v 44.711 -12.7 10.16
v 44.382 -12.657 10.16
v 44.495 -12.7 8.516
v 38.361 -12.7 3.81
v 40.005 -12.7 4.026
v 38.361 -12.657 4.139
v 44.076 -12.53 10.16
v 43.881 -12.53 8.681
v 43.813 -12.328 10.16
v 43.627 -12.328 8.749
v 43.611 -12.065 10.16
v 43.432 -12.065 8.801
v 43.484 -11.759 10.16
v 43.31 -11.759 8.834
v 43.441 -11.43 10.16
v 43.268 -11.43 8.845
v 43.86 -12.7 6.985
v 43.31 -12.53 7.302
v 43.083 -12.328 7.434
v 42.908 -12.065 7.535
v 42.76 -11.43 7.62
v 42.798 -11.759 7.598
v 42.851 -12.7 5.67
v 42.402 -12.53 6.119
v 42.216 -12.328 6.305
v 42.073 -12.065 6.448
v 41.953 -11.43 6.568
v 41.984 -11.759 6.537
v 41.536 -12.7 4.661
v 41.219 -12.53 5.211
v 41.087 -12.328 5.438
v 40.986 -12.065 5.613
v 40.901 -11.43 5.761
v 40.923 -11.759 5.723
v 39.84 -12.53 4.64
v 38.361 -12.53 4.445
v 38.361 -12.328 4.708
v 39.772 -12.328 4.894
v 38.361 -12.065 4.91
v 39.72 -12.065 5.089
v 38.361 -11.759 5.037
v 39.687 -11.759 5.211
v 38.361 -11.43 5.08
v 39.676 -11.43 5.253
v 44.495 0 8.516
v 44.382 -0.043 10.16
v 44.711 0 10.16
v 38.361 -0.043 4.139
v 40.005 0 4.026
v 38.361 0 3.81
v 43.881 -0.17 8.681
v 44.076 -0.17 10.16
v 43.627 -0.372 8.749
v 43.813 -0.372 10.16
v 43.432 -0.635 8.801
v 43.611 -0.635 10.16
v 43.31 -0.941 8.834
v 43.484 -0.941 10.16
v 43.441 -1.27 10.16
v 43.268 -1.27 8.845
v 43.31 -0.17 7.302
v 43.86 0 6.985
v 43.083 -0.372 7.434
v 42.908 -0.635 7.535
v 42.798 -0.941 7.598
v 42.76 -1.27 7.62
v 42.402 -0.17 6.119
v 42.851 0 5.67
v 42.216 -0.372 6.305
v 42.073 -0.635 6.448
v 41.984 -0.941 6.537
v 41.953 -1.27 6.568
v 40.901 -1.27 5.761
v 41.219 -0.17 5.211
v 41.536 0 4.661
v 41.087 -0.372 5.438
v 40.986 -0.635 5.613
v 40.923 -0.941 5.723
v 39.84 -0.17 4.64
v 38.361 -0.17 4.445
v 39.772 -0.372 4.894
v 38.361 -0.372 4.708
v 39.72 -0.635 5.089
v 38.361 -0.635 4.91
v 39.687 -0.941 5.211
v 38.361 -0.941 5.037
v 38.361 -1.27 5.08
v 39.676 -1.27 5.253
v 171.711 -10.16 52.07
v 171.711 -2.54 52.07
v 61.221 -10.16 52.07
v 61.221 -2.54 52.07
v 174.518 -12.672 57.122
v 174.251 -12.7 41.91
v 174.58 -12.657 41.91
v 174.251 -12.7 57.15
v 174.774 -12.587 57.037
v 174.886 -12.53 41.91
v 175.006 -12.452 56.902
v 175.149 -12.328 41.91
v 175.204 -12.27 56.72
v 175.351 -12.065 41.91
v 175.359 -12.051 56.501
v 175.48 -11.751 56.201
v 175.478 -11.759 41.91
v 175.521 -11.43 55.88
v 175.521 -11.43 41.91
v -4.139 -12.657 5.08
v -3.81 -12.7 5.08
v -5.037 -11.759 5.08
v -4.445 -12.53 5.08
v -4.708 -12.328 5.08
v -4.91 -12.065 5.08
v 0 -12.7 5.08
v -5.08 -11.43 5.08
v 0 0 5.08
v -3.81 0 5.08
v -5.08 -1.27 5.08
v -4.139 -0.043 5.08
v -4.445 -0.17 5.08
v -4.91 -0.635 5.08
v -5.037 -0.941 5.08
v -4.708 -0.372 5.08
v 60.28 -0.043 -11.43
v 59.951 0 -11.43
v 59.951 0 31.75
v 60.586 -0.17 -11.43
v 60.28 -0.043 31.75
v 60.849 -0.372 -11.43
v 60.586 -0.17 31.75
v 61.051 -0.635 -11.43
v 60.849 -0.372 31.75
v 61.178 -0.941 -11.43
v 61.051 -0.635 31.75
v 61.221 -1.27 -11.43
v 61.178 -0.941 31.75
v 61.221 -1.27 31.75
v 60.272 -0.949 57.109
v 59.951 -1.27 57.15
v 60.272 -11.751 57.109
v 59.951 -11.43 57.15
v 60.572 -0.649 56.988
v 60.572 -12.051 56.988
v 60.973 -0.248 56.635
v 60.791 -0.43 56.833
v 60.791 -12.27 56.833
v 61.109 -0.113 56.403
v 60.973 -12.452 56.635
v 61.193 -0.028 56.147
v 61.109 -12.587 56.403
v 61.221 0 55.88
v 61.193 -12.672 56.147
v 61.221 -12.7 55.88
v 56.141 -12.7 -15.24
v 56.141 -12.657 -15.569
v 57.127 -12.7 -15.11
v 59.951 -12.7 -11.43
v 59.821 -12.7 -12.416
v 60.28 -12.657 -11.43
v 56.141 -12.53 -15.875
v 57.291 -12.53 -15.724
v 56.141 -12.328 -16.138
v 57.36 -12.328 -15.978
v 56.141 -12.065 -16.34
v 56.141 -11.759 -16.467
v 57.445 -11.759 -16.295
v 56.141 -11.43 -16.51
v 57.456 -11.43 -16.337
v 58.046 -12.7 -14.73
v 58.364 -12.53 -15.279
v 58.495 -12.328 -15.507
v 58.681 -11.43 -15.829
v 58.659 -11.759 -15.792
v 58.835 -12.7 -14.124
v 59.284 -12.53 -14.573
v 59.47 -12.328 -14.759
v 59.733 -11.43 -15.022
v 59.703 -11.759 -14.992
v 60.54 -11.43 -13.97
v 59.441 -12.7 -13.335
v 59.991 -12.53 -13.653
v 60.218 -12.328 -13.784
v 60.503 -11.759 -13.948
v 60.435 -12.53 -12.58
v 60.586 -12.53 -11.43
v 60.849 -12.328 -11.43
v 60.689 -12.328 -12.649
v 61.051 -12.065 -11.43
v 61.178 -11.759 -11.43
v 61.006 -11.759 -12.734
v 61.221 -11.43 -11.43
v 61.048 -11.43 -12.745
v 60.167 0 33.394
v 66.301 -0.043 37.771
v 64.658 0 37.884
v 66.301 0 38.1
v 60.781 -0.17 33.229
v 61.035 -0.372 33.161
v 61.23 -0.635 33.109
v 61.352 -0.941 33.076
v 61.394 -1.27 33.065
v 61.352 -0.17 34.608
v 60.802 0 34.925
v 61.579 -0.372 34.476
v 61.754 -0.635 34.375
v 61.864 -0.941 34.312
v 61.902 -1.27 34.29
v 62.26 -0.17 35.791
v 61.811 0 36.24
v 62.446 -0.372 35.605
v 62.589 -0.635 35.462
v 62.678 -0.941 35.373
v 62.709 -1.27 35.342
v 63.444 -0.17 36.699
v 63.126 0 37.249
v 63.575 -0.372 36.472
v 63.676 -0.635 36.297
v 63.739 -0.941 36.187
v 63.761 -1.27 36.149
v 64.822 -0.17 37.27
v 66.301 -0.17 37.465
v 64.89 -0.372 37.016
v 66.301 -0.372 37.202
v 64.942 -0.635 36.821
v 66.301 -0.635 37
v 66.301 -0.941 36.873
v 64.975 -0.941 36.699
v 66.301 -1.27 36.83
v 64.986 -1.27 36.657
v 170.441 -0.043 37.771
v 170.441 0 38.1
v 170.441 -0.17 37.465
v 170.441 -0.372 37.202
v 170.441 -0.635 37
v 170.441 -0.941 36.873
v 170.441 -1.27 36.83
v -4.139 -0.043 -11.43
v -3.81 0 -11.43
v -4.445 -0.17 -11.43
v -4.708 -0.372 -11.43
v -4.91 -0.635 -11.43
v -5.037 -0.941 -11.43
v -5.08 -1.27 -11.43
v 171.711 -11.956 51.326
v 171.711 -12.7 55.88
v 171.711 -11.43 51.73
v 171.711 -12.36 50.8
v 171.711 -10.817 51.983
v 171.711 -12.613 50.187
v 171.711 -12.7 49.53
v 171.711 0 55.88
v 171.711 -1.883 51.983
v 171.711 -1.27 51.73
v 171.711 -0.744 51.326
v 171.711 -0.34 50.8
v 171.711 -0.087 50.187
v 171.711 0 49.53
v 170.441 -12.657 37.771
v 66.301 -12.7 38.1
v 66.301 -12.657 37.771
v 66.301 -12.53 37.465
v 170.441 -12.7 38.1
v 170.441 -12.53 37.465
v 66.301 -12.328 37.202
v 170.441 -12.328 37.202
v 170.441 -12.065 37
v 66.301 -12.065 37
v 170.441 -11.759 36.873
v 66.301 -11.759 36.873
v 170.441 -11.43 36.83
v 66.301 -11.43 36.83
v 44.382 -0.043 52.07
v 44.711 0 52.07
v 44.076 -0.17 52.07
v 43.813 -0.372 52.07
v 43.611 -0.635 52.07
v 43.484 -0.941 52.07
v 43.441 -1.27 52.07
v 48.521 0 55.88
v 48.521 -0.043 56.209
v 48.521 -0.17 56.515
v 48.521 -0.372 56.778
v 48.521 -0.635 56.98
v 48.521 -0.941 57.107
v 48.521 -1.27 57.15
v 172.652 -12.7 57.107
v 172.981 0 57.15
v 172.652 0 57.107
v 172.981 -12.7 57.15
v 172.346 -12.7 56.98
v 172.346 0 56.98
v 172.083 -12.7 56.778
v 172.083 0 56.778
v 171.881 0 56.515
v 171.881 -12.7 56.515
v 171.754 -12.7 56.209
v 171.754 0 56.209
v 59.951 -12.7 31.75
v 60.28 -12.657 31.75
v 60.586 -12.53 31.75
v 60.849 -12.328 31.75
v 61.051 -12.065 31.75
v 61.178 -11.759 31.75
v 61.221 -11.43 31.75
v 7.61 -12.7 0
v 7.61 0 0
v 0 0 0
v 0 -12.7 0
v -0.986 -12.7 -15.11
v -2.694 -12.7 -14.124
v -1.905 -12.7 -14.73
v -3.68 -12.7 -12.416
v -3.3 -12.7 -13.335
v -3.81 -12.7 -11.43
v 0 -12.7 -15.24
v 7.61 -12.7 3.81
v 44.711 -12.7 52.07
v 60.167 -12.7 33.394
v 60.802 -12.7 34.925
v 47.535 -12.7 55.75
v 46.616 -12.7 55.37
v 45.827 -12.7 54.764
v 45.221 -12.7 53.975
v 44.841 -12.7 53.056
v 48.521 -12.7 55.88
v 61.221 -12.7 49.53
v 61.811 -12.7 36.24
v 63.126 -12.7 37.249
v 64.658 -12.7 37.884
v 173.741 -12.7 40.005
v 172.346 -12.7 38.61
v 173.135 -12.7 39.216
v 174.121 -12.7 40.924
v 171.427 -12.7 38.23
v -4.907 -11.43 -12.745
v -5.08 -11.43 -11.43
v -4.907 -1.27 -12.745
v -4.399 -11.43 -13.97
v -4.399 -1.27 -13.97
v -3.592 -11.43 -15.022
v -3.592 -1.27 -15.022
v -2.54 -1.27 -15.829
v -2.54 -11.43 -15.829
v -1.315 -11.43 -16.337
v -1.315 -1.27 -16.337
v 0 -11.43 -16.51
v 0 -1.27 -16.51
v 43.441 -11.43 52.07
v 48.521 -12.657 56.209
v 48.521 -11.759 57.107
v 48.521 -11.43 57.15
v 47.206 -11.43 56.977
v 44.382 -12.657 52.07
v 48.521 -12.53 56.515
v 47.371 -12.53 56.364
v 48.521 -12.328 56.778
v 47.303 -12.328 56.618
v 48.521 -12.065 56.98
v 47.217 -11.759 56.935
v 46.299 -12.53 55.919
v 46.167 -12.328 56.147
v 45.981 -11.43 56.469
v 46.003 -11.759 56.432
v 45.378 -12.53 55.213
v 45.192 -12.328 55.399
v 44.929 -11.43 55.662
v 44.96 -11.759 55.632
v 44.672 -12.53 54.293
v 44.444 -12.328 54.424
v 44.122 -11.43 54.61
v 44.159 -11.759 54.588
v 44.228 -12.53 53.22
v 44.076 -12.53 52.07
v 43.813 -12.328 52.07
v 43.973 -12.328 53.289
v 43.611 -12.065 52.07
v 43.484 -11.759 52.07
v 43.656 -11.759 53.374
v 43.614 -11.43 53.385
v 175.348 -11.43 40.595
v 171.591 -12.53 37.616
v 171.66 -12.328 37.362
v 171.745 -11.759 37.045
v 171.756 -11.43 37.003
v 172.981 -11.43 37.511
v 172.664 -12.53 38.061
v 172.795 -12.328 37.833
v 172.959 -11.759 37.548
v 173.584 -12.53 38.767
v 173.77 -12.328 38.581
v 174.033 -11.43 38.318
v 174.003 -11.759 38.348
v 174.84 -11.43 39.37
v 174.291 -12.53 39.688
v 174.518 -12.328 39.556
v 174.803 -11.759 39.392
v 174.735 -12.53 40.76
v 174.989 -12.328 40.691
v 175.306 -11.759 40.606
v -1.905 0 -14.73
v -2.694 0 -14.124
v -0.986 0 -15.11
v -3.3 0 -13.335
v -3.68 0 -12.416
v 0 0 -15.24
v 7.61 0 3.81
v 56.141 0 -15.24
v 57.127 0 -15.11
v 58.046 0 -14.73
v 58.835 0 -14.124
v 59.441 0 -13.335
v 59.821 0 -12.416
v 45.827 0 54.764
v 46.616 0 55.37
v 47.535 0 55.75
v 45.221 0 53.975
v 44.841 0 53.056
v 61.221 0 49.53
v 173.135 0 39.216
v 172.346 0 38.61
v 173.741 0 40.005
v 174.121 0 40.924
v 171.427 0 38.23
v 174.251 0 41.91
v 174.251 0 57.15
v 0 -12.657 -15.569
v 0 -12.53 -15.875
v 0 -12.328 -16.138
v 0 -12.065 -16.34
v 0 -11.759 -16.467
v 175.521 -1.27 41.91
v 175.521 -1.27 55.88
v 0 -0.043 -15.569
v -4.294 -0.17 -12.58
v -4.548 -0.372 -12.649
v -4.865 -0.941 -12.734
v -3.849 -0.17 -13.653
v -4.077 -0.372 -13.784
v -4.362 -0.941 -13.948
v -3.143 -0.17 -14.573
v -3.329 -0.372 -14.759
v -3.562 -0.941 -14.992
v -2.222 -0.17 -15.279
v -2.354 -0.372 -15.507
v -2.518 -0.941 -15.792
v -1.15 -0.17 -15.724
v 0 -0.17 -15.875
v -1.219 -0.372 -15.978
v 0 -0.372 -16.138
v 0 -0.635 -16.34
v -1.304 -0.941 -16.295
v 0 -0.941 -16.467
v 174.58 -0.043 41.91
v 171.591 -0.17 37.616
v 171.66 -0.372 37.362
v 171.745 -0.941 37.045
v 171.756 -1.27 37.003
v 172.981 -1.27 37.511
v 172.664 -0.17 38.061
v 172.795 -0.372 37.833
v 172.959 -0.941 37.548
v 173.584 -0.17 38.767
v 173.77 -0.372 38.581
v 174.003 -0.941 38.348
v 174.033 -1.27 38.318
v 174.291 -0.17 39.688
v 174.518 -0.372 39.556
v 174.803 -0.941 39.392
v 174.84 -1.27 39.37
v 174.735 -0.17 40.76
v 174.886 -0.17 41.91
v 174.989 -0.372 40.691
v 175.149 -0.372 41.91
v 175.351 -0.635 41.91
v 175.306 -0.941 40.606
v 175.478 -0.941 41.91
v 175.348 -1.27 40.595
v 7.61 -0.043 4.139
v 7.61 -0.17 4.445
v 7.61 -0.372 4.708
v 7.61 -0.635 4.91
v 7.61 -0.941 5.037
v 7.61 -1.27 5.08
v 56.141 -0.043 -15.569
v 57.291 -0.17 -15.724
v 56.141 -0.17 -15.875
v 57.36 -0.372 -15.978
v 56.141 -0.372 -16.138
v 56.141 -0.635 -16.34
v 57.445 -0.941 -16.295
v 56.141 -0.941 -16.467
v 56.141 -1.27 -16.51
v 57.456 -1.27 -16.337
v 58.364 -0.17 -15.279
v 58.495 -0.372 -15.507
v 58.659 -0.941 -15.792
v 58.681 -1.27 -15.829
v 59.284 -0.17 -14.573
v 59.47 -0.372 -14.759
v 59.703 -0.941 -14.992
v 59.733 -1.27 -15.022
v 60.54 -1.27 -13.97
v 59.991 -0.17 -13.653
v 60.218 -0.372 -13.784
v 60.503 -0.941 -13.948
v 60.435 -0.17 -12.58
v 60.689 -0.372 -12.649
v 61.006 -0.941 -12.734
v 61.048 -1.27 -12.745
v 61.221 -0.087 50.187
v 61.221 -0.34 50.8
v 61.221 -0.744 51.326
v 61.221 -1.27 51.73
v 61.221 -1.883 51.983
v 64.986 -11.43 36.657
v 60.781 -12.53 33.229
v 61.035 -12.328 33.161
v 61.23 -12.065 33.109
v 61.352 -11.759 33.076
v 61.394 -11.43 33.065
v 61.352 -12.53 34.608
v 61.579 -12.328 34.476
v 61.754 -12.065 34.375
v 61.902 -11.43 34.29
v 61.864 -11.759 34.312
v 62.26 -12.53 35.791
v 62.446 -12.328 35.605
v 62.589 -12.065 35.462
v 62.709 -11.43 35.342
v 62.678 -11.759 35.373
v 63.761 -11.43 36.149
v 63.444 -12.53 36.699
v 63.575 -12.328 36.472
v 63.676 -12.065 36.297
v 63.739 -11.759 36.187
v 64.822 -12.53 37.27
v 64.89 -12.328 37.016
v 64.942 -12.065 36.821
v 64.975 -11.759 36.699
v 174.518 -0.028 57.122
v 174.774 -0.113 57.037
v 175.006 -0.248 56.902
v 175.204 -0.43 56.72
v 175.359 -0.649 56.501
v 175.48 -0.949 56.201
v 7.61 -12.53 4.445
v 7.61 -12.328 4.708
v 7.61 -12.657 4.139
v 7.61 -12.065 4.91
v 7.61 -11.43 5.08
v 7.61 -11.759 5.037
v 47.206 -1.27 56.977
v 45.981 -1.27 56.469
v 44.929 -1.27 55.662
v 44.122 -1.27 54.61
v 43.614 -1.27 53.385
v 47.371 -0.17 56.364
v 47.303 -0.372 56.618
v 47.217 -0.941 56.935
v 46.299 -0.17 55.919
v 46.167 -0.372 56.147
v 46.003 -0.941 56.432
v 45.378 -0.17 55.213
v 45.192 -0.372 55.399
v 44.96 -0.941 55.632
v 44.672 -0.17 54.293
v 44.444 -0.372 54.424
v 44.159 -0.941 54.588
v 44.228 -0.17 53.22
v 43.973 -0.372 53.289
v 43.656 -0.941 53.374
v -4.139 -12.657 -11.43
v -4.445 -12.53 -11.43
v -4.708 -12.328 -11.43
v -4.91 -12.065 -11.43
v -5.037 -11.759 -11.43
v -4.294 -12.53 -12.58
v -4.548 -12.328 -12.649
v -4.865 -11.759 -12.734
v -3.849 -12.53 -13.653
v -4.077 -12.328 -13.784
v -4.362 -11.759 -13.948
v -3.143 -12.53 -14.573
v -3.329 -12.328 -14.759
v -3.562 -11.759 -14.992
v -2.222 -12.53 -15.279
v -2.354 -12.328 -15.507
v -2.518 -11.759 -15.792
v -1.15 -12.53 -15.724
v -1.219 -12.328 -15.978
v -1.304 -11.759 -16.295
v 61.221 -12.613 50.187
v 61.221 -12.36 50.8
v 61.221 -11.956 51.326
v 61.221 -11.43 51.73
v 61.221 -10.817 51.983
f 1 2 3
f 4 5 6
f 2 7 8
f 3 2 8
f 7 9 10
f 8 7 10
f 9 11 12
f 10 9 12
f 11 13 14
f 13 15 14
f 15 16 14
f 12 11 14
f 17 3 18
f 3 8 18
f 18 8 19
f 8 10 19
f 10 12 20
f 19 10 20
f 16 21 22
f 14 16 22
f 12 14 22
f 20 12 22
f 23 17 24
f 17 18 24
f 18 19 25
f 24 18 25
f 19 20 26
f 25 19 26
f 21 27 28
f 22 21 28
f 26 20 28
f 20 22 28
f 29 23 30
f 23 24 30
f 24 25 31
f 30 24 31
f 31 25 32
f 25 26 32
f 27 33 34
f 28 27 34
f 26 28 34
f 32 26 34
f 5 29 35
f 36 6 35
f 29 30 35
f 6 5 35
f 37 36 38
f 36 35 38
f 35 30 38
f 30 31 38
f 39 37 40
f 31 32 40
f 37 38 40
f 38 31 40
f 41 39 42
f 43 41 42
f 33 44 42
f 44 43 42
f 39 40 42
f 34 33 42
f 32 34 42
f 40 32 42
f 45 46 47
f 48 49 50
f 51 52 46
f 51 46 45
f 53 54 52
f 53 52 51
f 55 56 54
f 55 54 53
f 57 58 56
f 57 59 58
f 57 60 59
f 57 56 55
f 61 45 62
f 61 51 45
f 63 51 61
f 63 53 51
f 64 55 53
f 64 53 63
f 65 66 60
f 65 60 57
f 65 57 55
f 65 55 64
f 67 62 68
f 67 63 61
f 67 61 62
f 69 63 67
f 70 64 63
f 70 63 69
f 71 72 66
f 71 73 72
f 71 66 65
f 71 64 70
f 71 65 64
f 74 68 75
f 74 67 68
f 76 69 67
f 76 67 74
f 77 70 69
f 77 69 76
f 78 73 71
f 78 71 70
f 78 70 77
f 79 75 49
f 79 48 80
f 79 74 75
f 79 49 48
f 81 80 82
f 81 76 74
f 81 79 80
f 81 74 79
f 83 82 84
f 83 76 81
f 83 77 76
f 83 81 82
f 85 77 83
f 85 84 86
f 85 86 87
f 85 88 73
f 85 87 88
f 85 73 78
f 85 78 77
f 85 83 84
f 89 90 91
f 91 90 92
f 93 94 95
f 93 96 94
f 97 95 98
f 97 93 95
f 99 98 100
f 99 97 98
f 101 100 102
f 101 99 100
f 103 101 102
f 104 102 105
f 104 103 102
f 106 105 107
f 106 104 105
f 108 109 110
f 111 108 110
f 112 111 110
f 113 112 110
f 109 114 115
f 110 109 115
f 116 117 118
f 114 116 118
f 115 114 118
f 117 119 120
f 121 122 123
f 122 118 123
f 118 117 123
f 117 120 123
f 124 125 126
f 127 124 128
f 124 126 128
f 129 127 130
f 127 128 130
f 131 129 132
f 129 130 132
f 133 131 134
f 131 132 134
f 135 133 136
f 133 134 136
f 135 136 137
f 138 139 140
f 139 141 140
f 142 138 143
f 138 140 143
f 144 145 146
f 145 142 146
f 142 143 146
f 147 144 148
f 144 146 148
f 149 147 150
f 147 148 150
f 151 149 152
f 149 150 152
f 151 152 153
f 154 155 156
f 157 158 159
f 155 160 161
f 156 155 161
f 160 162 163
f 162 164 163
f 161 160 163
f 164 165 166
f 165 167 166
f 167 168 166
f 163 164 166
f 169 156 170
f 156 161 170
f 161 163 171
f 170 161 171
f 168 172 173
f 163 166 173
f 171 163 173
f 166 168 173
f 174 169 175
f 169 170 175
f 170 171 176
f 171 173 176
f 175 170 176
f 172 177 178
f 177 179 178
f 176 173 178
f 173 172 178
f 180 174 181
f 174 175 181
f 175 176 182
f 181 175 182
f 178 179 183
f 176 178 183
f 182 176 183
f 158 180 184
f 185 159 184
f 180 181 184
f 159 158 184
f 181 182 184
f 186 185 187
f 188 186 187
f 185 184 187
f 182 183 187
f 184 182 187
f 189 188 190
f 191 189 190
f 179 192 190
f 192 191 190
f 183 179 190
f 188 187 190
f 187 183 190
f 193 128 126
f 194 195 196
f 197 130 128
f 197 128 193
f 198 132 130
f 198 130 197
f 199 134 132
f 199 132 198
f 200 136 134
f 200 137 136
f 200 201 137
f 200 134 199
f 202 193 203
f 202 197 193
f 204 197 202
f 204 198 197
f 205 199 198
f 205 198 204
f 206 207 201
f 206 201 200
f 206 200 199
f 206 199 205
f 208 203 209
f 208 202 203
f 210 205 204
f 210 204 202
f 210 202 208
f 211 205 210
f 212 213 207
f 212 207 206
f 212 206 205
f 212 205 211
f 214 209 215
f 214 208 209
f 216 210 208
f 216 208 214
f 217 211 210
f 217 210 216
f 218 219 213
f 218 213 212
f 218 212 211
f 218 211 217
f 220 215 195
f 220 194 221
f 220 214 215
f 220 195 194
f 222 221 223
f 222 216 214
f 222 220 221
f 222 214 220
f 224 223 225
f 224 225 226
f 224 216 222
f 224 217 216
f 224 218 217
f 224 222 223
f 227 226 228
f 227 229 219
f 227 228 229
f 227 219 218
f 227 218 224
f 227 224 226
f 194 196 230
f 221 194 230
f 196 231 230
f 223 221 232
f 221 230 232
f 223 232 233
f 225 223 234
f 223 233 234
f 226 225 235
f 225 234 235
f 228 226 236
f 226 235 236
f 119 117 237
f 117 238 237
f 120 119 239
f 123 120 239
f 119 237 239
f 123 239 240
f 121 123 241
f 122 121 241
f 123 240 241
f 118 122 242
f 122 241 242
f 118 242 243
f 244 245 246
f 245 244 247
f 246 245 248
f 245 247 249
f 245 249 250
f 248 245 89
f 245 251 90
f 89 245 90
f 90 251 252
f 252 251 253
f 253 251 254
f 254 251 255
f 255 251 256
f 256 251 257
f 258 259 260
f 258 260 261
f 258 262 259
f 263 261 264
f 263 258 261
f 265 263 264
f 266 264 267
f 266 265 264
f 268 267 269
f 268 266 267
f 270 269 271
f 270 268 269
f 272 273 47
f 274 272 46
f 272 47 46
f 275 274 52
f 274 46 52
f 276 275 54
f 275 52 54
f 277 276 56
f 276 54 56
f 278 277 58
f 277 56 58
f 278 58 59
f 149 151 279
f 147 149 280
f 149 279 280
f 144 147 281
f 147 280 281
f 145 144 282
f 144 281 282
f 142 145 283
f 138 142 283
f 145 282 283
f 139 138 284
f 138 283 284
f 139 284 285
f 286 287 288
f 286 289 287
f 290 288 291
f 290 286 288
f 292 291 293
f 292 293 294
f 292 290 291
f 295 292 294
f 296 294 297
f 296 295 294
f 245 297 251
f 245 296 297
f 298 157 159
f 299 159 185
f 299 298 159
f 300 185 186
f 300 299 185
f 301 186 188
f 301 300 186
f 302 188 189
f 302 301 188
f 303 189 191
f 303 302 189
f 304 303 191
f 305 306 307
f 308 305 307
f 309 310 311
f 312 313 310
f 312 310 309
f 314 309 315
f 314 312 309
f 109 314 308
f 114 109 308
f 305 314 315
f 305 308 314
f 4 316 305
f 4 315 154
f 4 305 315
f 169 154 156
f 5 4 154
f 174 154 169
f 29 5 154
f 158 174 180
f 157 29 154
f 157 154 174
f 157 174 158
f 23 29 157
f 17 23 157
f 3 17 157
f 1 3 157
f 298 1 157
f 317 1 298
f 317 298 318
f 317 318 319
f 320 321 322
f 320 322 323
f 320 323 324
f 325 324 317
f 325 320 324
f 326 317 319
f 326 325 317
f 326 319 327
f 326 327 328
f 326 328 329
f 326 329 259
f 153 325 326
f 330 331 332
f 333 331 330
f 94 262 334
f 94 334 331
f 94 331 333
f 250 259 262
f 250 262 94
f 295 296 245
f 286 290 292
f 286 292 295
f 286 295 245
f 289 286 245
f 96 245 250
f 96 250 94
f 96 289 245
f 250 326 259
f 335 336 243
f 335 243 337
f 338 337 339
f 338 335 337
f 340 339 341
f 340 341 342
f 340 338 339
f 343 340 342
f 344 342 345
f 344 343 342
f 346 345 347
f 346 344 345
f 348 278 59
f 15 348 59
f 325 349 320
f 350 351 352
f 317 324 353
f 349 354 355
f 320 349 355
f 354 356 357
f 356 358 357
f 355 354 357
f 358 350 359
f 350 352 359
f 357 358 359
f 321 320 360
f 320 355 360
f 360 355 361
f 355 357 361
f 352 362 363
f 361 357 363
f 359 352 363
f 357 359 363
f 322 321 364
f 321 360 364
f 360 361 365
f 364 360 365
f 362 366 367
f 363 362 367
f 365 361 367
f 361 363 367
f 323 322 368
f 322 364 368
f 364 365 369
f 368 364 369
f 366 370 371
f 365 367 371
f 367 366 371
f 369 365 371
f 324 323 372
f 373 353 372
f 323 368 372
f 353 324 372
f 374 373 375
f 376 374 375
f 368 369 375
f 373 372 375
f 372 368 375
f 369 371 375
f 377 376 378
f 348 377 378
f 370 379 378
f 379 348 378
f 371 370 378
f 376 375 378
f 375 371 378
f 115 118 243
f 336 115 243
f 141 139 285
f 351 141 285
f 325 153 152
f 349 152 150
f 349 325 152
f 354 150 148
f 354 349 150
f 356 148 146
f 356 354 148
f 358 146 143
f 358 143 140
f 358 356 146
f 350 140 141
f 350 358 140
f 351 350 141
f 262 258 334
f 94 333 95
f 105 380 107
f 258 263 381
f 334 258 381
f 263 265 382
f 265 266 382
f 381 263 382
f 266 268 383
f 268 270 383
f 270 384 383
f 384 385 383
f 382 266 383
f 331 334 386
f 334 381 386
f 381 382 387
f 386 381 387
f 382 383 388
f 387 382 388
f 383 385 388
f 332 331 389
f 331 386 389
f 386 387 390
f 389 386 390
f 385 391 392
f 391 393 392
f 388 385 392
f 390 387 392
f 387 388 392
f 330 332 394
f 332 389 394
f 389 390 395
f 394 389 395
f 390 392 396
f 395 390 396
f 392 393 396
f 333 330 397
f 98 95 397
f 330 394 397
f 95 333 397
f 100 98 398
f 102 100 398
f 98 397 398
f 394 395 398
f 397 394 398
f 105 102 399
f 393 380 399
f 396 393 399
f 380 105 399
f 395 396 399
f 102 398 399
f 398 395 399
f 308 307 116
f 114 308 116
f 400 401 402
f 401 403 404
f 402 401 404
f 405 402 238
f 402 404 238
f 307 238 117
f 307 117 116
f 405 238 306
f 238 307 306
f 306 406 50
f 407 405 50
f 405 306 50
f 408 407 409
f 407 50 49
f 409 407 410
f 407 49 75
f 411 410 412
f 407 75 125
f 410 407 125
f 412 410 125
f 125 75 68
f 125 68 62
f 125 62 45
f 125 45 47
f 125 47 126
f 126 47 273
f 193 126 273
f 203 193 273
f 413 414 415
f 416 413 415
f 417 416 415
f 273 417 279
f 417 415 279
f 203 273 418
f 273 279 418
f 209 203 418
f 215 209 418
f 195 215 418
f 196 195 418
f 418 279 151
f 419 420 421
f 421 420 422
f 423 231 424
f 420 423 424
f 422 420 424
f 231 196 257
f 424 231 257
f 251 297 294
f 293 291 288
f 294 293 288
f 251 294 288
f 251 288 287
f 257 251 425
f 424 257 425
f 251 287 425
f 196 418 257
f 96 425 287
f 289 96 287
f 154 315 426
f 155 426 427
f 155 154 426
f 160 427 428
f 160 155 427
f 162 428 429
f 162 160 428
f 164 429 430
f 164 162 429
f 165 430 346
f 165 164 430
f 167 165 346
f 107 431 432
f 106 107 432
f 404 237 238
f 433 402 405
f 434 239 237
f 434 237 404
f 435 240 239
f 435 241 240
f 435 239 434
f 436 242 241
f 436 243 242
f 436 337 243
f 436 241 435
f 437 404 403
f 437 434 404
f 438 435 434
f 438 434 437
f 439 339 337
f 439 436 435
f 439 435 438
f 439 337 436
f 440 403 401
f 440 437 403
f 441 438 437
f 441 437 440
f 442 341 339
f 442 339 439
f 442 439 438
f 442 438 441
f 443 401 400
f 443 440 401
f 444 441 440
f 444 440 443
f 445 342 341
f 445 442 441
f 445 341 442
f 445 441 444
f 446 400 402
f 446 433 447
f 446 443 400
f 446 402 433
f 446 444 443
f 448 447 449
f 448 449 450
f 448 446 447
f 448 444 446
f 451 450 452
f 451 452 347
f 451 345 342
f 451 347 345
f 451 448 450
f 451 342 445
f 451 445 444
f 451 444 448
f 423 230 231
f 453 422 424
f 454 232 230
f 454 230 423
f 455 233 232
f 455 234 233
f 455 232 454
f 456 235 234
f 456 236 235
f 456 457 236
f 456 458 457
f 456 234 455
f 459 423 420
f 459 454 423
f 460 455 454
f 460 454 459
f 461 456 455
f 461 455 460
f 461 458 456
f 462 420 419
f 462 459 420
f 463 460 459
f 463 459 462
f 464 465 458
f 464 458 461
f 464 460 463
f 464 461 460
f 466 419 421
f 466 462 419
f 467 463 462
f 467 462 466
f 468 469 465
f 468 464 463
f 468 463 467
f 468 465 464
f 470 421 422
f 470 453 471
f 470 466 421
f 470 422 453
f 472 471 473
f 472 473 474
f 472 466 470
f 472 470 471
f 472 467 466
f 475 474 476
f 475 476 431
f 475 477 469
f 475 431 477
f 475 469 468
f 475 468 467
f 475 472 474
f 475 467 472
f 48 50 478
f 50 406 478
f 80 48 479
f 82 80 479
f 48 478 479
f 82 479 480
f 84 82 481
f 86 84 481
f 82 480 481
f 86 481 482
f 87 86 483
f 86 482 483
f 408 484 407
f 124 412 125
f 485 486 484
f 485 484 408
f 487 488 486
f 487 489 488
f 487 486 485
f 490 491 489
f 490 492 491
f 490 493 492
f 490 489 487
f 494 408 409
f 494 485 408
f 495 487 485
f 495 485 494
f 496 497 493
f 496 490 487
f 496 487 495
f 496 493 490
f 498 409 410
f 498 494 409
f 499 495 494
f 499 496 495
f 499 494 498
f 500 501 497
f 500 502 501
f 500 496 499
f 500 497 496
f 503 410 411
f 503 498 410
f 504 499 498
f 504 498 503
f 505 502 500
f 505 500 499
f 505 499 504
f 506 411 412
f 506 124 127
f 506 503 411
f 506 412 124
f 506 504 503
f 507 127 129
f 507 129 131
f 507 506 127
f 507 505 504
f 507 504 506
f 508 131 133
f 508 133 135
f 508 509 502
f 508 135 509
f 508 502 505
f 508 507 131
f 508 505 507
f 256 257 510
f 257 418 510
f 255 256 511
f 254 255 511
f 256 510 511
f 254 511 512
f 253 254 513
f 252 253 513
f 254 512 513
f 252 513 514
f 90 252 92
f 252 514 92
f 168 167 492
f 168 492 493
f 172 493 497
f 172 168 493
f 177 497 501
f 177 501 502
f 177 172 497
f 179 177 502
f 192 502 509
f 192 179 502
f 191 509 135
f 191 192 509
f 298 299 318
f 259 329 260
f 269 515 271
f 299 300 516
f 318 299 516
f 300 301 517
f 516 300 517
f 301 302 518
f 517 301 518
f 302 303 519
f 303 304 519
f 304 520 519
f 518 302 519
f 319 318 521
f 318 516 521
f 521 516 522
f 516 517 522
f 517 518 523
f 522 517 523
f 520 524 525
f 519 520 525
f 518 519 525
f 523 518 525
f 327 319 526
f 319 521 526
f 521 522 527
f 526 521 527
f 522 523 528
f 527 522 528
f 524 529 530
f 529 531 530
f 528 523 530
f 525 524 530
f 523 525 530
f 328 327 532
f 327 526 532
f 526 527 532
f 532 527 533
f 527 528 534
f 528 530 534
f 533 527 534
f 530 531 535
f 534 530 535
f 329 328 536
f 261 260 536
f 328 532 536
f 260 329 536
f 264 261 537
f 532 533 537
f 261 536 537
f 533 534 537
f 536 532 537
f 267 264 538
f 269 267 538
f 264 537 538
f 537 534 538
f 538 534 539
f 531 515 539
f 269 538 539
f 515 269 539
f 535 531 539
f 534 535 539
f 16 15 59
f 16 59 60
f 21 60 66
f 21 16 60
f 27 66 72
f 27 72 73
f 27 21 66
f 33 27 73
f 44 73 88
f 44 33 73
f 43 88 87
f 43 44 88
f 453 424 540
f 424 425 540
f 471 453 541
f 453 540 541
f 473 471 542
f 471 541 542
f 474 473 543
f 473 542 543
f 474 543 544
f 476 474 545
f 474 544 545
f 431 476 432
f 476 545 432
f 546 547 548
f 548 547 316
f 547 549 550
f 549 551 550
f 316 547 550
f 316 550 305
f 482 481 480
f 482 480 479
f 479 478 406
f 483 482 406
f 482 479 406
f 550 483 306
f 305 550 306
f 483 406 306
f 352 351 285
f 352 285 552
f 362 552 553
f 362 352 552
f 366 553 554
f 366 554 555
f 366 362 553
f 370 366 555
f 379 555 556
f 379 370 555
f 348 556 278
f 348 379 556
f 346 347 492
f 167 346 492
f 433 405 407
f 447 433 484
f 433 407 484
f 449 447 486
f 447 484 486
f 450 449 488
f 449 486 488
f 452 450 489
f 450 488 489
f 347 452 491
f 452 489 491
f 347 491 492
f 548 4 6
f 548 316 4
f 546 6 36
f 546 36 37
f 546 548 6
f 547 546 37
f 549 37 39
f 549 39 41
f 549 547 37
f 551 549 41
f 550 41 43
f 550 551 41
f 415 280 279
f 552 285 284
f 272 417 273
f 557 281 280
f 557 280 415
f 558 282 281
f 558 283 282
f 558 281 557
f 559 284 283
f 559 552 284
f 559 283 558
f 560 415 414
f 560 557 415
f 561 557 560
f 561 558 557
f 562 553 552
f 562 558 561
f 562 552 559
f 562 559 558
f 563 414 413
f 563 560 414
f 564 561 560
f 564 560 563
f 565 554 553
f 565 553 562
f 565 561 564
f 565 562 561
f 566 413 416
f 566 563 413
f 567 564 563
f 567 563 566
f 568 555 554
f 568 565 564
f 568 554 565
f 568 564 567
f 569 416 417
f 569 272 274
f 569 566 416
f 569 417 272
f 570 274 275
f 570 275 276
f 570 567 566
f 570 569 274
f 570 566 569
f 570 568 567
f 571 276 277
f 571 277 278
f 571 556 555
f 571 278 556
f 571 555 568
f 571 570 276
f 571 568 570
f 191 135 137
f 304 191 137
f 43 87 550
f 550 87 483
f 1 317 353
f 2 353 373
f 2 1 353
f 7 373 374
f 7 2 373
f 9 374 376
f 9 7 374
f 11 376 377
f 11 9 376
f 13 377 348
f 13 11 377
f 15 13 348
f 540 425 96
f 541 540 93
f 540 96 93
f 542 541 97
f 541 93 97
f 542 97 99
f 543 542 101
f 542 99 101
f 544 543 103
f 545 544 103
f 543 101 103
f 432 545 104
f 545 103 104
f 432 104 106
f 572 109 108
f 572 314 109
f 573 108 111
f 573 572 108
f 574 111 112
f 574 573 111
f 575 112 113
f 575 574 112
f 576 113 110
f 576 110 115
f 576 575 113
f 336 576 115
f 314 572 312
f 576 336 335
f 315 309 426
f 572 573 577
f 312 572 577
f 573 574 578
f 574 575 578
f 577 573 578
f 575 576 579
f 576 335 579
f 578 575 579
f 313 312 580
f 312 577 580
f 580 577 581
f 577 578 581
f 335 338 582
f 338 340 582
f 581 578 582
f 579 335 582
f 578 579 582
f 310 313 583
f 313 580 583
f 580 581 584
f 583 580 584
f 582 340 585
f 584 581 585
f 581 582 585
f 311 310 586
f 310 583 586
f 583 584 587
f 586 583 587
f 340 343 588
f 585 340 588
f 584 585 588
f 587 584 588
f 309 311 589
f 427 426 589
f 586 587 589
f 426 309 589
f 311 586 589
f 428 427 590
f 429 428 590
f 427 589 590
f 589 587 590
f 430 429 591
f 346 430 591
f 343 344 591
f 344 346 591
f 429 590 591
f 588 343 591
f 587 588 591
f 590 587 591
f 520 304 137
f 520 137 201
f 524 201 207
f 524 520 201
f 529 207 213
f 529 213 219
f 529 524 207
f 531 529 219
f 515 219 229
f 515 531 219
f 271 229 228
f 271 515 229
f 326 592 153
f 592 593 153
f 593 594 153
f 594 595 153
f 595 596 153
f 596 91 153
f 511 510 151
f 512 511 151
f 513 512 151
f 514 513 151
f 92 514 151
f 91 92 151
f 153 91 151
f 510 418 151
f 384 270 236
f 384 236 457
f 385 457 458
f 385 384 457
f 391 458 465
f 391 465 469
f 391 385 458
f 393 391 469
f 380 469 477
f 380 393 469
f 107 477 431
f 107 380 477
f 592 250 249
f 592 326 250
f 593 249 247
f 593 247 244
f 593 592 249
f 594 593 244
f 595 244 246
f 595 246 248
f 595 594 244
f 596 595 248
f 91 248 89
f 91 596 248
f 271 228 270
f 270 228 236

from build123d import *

# Parameters (mm, degrees)
F1_DEPTH = 12.7
F2_R     = 5.08
F3_R     = 2.54
F4_R     = 1.27


with BuildPart() as f1:
    # F0 (on Front) → F1 (new body)
    with BuildSketch(Plane.XZ):
        Polygon((7.609934, 0), (0, 0), (0, 5.08), (-5.08, 5.08), (-5.08, -16.51), (61.221046, -16.51), (61.221046, 5.08), (61.221046, 36.83), (175.521046, 36.83), (175.521046, 57.15), (171.711046, 57.15), (171.711046, 52.07), (61.221046, 52.07), (61.221046, 57.15), (43.441046, 57.15), (43.441046, 5.08), (7.609934, 5.08), align=None)
    extrude(amount=F1_DEPTH)

    # F2
    f2_edges = [f1.edges().sort_by_distance(p)[0] for p in [
        (61.221046, -6.35, -16.51),
        (43.441046, -6.35, 57.15),
        (43.441046, -6.35, 5.08),
        (61.221046, -6.35, 36.83),
        (175.521046, -6.35, 36.83),
        (-5.08, -6.35, -16.51),
    ]]
    fillet(f2_edges, radius=F2_R)

    # F3
    f3_edges = [f1.edges().sort_by_distance(p)[0] for p in [
        (116.466046, -12.7, 52.07),
        (116.466046, 0, 52.07),
    ]]
    fillet(f3_edges, radius=F3_R)

    # F4
    f4_edges = [f1.edges().sort_by_distance(p)[0] for p in [
        (43.441046, -12.7, 31.115),
        (22.98549, 0, 5.08),
        (-5.08, -12.7, -3.175),
        (-5.08, 0, -3.175),
        (61.221046, -6.35, 57.15),
        (171.711046, -6.35, 57.15),
        (175.521046, -6.35, 57.15),
    ]]
    fillet(f4_edges, radius=F4_R)


solid = f1.part
